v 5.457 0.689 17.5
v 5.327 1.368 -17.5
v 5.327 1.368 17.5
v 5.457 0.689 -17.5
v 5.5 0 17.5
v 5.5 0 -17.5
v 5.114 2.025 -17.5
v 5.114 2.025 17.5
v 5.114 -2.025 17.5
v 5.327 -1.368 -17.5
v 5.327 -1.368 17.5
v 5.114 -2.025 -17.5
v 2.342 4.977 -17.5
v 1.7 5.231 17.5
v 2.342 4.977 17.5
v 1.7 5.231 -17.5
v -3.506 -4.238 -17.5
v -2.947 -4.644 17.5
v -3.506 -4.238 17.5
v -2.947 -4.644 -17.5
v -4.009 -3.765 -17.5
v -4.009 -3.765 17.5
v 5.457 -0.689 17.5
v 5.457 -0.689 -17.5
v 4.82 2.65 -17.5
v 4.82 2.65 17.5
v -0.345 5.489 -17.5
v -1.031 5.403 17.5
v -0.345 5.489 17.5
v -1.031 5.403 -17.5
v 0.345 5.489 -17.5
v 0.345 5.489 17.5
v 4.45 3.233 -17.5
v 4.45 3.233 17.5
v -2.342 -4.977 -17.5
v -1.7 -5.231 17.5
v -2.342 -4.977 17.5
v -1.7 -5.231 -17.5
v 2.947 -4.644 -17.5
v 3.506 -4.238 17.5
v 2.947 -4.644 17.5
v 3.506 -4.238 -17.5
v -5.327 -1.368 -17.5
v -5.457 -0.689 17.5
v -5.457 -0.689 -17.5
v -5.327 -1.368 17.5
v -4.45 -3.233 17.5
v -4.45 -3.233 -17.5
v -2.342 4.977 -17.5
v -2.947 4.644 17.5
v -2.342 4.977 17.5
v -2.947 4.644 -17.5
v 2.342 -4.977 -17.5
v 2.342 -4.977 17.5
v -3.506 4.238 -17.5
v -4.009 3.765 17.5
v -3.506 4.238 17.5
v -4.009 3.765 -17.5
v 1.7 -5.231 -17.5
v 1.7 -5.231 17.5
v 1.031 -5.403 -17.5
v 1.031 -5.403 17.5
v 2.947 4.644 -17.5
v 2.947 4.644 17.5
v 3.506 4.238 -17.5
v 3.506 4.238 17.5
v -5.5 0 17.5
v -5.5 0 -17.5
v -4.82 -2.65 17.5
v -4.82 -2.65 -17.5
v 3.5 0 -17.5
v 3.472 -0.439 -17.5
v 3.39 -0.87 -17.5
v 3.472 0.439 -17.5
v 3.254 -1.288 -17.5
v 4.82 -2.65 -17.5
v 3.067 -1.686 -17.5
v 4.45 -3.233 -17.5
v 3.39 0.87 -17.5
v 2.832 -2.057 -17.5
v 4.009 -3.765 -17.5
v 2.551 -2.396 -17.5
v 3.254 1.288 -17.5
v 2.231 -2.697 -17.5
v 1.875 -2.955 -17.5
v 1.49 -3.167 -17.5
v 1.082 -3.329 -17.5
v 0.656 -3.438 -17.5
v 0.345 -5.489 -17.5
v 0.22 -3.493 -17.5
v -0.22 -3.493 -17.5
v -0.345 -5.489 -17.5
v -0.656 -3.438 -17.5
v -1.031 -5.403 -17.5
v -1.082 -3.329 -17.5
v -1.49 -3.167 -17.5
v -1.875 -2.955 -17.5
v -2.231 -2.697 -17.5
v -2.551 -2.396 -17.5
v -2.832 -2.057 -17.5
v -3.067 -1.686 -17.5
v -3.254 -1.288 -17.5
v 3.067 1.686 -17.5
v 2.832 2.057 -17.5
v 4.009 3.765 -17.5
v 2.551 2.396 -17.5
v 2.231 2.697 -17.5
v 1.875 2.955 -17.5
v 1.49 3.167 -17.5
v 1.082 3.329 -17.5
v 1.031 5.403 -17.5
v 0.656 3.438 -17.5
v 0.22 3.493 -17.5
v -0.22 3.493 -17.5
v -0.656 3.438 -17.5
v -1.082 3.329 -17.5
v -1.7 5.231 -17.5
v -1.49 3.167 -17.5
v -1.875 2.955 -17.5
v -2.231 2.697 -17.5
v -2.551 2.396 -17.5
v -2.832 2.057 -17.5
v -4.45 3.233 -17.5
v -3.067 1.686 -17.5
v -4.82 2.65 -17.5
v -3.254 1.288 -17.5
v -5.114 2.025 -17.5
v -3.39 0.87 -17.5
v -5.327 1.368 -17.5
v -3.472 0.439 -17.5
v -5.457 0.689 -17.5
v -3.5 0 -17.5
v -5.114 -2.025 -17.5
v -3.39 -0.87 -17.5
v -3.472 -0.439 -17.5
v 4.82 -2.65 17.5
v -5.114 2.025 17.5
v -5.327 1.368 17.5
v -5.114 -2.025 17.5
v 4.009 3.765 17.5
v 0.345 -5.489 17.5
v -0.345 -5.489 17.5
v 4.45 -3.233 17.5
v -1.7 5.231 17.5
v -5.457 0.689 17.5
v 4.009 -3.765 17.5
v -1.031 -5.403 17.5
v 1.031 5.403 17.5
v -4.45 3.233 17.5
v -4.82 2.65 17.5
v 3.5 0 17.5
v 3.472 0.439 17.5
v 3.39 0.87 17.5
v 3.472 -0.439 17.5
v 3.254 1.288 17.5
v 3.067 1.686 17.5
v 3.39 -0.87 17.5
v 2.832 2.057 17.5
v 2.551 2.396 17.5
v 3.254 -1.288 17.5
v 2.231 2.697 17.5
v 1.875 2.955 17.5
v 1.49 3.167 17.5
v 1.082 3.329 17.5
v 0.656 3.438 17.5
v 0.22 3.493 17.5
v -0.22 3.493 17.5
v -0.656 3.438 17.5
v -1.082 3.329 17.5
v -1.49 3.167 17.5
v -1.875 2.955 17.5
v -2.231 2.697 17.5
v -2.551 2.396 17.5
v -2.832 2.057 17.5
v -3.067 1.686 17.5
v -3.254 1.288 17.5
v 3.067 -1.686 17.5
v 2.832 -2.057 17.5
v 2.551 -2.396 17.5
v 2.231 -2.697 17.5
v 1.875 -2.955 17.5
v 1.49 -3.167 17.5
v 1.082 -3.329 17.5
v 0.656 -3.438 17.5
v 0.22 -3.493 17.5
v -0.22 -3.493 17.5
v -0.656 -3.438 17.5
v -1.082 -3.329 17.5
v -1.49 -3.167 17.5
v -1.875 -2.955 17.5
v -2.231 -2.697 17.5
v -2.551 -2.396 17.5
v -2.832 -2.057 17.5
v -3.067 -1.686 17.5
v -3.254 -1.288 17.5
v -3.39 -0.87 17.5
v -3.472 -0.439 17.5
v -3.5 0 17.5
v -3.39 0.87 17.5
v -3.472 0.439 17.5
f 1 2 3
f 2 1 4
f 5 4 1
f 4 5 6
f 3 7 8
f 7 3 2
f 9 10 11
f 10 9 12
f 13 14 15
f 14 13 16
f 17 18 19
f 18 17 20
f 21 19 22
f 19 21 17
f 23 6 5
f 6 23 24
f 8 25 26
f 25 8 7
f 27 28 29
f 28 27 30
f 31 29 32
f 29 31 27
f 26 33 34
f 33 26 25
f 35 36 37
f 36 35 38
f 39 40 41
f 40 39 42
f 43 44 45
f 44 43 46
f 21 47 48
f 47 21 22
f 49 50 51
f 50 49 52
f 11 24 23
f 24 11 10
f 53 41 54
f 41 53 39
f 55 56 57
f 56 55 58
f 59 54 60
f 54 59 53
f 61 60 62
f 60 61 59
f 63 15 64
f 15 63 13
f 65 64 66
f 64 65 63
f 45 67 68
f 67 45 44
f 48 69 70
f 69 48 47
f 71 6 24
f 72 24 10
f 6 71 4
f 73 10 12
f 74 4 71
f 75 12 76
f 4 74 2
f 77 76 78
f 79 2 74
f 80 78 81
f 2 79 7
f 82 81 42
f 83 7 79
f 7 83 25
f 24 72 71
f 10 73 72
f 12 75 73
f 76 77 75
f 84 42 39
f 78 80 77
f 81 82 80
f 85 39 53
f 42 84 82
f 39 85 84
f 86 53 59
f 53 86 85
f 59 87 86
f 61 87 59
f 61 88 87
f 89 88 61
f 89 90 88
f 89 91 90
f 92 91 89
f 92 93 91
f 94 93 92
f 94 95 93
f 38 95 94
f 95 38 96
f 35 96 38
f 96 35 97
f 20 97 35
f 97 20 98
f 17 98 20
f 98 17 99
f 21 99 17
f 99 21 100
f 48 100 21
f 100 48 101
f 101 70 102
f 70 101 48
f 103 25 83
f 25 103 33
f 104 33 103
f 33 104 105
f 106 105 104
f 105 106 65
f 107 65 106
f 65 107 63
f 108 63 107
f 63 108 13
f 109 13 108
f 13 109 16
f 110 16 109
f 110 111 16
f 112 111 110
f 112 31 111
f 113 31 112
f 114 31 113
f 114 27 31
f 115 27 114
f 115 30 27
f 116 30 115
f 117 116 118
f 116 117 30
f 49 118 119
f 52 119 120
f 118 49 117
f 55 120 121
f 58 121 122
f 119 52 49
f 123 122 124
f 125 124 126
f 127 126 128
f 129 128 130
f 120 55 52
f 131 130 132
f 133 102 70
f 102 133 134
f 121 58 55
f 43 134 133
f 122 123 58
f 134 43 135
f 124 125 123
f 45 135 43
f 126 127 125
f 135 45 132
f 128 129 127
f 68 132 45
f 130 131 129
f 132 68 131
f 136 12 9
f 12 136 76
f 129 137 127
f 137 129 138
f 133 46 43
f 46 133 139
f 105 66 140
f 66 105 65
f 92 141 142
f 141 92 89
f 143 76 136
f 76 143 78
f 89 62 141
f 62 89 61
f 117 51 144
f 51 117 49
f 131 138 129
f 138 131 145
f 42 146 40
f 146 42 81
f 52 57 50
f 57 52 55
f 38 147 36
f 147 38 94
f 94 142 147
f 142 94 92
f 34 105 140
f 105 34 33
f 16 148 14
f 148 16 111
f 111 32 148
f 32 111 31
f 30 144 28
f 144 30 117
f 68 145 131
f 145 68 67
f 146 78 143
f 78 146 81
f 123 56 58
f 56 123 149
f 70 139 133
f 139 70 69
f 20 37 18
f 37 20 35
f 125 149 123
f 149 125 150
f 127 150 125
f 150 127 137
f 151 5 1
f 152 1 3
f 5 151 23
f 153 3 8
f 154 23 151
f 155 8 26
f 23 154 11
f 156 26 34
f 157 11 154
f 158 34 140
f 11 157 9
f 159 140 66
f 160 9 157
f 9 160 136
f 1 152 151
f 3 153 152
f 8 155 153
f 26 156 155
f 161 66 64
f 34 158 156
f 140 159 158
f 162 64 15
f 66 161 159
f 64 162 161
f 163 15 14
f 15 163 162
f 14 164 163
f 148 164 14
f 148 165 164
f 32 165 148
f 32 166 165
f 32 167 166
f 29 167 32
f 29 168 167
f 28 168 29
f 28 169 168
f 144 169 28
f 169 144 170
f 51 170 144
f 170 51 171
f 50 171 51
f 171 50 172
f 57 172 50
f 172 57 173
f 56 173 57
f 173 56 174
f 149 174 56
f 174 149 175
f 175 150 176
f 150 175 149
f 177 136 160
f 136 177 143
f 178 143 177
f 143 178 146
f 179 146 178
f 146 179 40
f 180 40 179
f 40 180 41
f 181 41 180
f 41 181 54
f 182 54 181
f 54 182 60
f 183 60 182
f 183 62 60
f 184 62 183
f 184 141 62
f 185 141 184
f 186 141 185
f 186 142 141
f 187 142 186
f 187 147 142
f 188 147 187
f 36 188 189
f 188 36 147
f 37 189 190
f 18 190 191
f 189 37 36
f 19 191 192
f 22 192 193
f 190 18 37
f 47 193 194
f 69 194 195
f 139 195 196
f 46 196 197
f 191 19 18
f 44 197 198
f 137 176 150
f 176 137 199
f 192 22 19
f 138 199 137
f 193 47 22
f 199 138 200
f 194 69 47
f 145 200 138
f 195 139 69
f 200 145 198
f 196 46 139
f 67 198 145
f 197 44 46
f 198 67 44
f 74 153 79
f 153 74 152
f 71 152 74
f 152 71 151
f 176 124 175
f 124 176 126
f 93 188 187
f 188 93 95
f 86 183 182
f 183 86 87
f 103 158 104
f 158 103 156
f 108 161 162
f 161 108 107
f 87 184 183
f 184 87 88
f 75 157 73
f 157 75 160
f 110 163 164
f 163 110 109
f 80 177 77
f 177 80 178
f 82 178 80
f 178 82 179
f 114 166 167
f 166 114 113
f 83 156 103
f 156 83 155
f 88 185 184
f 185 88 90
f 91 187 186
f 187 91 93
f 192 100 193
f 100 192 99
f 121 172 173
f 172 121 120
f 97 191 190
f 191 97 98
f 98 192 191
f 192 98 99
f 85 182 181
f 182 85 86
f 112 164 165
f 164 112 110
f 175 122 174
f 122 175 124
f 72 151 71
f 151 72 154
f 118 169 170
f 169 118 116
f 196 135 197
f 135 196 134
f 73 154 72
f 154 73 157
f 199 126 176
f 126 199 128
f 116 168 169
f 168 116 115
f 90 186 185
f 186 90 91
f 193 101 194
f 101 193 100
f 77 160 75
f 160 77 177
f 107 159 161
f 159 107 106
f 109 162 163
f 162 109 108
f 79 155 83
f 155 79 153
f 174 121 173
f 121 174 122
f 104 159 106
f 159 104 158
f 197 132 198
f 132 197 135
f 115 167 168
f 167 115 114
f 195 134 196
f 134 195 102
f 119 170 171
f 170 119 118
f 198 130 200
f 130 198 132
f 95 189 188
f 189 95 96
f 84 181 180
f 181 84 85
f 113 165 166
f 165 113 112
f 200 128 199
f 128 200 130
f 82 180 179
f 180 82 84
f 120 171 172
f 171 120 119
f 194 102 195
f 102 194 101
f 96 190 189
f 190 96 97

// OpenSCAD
$fn = 50;


difference() {
	union() {
		translate(v = [0, 0, -17.5000000000]) {
			cylinder(h = 35, r = 5.5000000000);
		}
	}
	union() {
		translate(v = [0, 0, -100.0000000000]) {
			cylinder(h = 200, r = 3.5000000000);
		}
	}
}
